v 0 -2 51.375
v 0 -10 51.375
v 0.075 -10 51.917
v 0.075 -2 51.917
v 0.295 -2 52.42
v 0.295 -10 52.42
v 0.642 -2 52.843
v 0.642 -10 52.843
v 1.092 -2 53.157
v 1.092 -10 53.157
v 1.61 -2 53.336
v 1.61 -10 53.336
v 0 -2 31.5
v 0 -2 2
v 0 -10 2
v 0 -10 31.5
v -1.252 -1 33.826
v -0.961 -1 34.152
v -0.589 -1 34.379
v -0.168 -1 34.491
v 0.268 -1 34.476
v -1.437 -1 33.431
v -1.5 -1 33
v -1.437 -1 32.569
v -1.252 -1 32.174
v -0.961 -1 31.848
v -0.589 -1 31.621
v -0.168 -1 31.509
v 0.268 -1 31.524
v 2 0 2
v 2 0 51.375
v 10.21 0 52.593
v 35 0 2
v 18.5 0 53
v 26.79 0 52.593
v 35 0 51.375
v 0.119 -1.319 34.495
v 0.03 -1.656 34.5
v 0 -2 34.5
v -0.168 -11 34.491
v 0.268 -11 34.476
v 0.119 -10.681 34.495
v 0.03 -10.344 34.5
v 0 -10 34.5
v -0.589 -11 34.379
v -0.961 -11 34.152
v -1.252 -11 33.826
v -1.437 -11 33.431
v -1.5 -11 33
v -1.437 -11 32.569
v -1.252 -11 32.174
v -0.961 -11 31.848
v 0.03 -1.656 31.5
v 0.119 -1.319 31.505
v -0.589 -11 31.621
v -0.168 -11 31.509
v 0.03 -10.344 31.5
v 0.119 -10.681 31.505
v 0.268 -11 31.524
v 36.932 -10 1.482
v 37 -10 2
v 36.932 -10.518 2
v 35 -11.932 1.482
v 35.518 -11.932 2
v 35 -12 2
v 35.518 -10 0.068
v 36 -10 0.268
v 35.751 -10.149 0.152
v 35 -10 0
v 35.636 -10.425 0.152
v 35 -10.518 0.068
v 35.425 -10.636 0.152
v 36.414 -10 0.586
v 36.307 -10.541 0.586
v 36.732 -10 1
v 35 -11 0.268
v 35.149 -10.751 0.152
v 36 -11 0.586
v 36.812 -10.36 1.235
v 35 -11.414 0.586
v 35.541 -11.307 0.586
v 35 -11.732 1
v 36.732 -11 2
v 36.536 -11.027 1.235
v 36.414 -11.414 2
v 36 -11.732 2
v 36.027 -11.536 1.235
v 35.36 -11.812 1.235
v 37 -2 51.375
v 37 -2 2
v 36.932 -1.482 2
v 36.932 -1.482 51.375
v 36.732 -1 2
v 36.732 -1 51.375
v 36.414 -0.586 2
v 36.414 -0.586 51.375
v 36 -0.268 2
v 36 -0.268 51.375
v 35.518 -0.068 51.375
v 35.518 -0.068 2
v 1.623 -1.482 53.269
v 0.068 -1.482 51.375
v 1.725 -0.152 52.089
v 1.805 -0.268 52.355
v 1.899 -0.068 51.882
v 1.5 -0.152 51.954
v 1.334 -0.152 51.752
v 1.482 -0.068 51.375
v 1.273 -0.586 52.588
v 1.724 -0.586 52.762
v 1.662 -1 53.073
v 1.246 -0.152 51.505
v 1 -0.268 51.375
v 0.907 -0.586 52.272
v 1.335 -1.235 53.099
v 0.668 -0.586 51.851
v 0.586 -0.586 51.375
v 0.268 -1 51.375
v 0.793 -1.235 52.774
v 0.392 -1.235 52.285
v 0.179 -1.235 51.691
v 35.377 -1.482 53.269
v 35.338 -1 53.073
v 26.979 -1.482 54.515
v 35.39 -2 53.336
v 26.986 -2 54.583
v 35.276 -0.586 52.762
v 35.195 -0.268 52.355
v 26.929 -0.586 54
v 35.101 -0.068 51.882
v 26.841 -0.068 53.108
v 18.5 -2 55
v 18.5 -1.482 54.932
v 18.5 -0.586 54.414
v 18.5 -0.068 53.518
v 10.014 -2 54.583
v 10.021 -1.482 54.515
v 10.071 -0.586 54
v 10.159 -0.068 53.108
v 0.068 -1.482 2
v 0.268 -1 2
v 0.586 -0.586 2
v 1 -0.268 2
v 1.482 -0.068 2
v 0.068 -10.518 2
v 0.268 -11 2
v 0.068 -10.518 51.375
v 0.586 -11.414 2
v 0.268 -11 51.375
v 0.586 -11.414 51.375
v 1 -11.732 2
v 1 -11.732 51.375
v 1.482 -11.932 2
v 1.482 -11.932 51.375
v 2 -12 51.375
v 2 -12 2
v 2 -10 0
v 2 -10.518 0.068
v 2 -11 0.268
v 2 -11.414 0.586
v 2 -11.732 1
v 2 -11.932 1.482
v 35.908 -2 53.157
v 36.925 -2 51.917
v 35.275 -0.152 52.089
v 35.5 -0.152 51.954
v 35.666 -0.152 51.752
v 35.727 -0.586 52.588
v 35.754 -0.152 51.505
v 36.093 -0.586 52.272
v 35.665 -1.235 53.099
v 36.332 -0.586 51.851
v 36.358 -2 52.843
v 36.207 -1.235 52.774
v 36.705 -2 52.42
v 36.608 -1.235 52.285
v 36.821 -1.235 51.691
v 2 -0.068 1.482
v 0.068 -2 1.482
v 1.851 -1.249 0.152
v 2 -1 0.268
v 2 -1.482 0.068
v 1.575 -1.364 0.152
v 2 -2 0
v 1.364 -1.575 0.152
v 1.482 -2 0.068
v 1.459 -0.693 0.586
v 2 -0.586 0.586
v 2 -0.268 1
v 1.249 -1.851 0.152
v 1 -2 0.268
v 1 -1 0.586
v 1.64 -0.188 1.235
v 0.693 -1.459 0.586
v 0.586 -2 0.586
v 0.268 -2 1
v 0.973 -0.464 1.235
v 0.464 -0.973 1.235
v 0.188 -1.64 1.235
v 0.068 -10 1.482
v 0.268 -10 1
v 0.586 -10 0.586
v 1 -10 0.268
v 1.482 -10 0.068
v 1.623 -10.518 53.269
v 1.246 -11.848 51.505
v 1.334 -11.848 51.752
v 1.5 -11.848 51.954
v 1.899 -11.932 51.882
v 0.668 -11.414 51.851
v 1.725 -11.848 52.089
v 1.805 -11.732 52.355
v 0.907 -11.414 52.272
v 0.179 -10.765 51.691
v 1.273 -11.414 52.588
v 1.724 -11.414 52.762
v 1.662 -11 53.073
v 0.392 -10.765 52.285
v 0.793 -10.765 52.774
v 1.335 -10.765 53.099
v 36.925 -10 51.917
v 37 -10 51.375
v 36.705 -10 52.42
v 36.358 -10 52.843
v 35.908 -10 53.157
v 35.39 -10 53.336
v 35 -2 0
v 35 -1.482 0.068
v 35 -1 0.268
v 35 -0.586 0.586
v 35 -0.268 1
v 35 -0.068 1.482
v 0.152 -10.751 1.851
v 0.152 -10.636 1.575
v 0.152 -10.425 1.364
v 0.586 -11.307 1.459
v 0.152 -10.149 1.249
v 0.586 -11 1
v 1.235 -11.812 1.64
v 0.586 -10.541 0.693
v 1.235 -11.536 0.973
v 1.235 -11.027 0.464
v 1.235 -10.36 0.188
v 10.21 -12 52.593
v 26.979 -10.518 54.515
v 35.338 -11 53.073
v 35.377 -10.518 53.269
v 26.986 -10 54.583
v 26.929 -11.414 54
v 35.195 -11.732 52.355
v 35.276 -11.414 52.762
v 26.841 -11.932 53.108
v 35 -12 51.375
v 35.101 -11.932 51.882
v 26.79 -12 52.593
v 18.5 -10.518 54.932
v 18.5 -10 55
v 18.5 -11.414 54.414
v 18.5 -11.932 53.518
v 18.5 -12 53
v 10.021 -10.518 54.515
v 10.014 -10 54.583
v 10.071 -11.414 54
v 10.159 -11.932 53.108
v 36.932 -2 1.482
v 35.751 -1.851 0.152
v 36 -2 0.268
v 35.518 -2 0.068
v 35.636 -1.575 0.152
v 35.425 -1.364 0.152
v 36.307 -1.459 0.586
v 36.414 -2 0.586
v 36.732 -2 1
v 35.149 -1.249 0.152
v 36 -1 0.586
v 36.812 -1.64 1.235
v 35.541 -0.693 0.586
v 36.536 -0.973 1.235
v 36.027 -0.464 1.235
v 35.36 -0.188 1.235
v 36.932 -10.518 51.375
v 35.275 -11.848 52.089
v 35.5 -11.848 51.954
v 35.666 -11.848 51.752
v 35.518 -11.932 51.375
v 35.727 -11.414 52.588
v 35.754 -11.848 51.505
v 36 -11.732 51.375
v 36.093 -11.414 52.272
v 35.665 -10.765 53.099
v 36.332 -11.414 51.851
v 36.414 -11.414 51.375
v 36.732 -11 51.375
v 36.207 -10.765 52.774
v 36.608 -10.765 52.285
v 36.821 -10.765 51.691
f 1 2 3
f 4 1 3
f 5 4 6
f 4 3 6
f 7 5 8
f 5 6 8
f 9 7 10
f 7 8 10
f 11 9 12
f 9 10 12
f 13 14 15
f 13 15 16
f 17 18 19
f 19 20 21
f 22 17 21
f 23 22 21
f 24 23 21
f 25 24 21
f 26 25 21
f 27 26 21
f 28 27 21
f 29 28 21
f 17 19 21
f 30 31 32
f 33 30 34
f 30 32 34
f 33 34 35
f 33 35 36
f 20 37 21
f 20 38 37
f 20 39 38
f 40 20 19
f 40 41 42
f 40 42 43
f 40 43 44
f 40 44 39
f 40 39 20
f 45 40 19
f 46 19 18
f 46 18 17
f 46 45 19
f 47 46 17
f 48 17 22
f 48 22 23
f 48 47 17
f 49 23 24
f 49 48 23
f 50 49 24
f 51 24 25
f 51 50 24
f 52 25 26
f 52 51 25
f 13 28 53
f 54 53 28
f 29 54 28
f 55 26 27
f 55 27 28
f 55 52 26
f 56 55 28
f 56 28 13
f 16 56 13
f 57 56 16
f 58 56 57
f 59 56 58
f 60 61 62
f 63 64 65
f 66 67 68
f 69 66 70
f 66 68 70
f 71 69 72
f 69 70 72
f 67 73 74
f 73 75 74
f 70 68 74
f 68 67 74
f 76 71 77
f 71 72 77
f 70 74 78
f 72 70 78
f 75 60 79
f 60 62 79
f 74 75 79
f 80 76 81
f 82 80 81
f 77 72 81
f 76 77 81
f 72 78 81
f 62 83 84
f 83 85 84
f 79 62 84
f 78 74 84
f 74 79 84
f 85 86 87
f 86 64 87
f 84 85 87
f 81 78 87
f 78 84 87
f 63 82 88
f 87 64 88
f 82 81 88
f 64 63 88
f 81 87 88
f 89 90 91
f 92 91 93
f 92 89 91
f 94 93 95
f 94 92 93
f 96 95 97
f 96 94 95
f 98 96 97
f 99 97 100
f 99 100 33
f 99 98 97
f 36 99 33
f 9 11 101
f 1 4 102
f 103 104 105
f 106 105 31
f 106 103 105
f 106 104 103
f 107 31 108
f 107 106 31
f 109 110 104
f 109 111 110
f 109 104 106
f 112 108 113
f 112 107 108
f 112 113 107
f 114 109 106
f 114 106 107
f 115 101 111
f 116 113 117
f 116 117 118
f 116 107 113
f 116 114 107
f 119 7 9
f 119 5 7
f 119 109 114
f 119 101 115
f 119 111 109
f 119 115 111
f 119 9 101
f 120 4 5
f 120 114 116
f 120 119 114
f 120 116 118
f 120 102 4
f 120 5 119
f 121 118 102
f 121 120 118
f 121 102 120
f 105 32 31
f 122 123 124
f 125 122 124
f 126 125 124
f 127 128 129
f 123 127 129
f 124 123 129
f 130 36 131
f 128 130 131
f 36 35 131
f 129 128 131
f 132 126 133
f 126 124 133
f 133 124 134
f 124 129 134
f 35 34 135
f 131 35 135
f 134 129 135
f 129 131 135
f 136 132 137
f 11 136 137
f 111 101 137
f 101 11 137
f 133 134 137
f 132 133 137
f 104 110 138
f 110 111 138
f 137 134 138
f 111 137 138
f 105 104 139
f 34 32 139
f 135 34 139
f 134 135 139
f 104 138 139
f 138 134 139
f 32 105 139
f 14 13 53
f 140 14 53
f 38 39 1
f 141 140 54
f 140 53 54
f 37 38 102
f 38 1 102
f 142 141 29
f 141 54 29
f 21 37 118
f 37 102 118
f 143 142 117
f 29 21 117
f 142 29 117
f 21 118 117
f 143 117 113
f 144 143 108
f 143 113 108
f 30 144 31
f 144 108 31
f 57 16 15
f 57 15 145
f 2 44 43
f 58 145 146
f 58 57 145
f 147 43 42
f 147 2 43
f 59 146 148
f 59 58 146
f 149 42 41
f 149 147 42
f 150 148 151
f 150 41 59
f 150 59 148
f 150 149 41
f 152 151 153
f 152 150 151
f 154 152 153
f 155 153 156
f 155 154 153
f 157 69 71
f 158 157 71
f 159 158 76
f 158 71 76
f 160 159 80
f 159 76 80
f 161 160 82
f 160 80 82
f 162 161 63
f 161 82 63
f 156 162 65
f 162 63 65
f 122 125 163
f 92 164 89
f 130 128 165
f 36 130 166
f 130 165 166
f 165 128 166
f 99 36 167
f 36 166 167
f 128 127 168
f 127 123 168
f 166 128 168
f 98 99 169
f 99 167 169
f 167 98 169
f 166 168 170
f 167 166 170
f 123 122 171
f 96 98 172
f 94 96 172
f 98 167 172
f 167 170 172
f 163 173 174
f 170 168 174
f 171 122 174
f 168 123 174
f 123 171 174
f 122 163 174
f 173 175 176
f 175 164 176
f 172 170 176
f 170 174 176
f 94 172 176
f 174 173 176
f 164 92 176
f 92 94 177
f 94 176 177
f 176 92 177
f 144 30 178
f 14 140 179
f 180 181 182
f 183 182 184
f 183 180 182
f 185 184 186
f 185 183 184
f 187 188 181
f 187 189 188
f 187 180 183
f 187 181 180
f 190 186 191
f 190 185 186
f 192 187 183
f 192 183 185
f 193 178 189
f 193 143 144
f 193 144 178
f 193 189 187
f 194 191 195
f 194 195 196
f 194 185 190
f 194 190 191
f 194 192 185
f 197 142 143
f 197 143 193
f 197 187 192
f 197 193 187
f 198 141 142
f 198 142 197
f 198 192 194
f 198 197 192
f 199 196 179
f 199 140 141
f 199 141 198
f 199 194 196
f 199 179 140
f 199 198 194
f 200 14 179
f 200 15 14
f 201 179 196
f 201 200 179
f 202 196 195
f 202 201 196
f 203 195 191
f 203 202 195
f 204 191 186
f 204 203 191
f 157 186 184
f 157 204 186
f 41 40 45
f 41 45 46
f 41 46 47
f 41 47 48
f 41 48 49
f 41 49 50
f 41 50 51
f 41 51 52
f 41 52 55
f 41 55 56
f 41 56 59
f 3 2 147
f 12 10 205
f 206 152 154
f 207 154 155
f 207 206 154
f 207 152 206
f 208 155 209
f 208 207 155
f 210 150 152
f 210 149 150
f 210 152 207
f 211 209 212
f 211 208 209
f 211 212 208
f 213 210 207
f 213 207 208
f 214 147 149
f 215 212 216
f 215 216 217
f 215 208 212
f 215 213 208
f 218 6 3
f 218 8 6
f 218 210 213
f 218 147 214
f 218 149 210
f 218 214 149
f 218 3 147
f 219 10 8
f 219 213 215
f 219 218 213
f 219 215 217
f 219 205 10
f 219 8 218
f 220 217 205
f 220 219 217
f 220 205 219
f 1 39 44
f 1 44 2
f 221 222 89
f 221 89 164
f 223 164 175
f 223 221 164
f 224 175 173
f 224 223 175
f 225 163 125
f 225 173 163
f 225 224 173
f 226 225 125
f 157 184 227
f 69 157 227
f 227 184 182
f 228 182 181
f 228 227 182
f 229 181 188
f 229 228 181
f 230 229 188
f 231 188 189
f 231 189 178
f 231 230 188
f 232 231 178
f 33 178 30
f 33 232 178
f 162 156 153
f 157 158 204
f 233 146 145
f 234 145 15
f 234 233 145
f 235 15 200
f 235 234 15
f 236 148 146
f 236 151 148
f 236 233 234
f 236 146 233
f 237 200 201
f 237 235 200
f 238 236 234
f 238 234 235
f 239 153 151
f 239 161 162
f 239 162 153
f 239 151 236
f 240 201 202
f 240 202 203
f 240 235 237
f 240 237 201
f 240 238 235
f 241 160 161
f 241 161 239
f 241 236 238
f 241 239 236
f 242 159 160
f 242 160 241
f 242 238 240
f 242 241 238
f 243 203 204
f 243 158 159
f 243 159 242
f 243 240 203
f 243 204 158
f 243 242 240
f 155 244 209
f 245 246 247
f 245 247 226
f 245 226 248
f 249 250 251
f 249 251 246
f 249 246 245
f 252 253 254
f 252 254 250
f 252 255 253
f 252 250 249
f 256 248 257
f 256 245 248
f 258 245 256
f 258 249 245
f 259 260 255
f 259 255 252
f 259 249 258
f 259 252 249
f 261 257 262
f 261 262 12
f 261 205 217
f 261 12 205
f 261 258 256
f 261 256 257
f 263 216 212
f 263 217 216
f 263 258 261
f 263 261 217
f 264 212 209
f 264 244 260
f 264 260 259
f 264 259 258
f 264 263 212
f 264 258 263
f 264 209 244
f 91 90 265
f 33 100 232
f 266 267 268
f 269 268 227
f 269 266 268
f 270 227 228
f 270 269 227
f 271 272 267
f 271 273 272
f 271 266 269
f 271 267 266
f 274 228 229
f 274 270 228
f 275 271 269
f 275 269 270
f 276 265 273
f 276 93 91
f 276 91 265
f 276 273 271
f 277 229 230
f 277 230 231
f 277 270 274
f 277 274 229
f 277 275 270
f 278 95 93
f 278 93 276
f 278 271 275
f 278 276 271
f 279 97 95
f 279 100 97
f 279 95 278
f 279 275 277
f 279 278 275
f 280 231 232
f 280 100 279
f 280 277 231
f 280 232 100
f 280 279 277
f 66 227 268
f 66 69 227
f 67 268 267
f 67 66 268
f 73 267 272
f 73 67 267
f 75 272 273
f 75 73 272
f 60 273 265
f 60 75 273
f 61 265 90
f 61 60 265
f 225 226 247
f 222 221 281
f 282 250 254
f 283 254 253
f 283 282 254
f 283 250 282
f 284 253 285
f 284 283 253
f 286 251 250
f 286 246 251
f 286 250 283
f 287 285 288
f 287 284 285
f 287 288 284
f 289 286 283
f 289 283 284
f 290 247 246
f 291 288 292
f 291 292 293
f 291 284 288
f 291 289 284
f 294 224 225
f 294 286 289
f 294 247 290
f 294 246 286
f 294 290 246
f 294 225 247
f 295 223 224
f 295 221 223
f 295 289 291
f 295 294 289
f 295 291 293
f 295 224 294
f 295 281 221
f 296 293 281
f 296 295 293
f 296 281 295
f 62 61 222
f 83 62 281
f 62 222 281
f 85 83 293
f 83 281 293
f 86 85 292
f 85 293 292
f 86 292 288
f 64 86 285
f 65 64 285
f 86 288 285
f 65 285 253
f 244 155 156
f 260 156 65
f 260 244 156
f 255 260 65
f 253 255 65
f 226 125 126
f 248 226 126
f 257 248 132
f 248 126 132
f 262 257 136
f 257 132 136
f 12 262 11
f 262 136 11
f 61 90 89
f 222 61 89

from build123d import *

# Parameters (mm, degrees)
F0_W     = 37
F0_H     = 53
F1_DEPTH = 12
F2_R     = 2
F4_R     = 1.5
F5_DEPTH = 5


with BuildPart() as f1:
    # F0 (on Front) → F1 (new body)
    with BuildSketch(Plane.XZ):
        with Locations((18.5, 26.5)):
            Rectangle(F0_W, F0_H)
        with BuildLine():
            ThreePointArc((37, 53), (18.5, 55), (0, 53))
            Line((0, 53), (37, 53))
        make_face()
    extrude(amount=F1_DEPTH)

    # F2
    f2_edges = [f1.edges().sort_by_distance(p)[0] for p in [
        (37, -6, 53),
        (18.5, -12, 55),
        (0, -6, 53),
        (18.5, 0, 55),
        (37, -12, 26.5),
        (37, 0, 26.5),
        (37, -6, 0),
        (18.5, -12, 0),
        (0, -12, 26.5),
        (0, 0, 26.5),
        (18.5, 0, 0),
        (0, -6, 0),
    ]]
    fillet(f2_edges, radius=F2_R)

    # F4 (on offset) → F5 (join, symmetric)
    with BuildSketch(Plane.XZ.offset(6)):
        with Locations((0, 33)):
            Circle(F4_R)
    extrude(amount=F5_DEPTH, both=True)


solid = f1.part
